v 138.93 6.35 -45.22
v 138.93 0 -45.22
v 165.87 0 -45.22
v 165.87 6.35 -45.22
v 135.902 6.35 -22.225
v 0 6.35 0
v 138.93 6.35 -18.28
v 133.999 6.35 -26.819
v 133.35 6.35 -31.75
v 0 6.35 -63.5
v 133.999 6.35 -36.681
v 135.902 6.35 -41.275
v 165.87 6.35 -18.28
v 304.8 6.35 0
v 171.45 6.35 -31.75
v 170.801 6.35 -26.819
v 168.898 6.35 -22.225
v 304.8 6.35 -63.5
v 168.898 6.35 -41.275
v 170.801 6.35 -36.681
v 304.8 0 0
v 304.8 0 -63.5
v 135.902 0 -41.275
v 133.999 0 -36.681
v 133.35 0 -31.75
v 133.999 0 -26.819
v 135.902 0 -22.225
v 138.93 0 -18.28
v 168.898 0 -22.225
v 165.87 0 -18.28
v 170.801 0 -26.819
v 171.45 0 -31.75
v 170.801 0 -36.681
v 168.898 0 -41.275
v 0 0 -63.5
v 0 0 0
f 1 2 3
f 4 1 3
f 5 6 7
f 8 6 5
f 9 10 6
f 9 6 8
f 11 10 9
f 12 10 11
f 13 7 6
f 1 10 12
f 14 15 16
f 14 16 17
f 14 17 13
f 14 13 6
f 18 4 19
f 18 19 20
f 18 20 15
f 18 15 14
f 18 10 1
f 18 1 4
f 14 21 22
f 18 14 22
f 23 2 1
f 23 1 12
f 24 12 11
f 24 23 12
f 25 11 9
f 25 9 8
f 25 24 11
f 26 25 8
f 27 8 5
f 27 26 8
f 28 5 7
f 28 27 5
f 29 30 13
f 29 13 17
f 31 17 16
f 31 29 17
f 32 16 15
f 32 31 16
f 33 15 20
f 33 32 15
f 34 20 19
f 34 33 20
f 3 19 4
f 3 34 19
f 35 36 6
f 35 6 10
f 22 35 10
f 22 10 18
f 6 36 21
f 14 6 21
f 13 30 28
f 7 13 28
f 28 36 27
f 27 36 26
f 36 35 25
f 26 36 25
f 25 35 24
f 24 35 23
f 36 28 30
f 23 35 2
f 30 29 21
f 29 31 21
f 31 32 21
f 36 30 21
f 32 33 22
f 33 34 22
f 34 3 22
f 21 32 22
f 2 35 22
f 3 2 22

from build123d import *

# Parameters (mm, degrees)
SKETCH1_W           = 304.8
SKETCH1_H           = 63.5
SKETCH1_R           = 19.05
BOSS_EXTRUDE1_DEPTH = 6.35


with BuildPart() as part:
    # Sketch1 → Boss-Extrude1 (new body)
    # profile 1 of 3: a face of its own
    with BuildSketch(Plane(origin=(0, 0, 0), x_dir=(1, 0, 0), z_dir=(0, 1, 0))):
        with Locations((152.4, 31.75)):
            Rectangle(SKETCH1_W, SKETCH1_H)
        with Locations((152.4, 31.75)):
            Circle(SKETCH1_R, mode=Mode.SUBTRACT)
    # profile 2 of 3: a face of its own
    with BuildSketch(Plane(origin=(0, 0, 0), x_dir=(1, 0, 0), z_dir=(0, 1, 0))):
        with BuildLine():
            Line((138.929615818, 45.220384182), (165.870384182, 45.220384182))
            ThreePointArc((165.870384182, 45.220384182), (152.4, 50.8), (138.929615818, 45.220384182))
        make_face()
    # profile 3 of 3: a face of its own
    with BuildSketch(Plane(origin=(0, 0, 0), x_dir=(1, 0, 0), z_dir=(0, 1, 0))):
        with BuildLine():
            ThreePointArc((138.929615818, 18.279615818), (152.4, 12.7), (165.870384182, 18.279615818))
            Line((165.870384182, 18.279615818), (138.929615818, 18.279615818))
        make_face()
    extrude(amount=BOSS_EXTRUDE1_DEPTH)


solid = part.part
